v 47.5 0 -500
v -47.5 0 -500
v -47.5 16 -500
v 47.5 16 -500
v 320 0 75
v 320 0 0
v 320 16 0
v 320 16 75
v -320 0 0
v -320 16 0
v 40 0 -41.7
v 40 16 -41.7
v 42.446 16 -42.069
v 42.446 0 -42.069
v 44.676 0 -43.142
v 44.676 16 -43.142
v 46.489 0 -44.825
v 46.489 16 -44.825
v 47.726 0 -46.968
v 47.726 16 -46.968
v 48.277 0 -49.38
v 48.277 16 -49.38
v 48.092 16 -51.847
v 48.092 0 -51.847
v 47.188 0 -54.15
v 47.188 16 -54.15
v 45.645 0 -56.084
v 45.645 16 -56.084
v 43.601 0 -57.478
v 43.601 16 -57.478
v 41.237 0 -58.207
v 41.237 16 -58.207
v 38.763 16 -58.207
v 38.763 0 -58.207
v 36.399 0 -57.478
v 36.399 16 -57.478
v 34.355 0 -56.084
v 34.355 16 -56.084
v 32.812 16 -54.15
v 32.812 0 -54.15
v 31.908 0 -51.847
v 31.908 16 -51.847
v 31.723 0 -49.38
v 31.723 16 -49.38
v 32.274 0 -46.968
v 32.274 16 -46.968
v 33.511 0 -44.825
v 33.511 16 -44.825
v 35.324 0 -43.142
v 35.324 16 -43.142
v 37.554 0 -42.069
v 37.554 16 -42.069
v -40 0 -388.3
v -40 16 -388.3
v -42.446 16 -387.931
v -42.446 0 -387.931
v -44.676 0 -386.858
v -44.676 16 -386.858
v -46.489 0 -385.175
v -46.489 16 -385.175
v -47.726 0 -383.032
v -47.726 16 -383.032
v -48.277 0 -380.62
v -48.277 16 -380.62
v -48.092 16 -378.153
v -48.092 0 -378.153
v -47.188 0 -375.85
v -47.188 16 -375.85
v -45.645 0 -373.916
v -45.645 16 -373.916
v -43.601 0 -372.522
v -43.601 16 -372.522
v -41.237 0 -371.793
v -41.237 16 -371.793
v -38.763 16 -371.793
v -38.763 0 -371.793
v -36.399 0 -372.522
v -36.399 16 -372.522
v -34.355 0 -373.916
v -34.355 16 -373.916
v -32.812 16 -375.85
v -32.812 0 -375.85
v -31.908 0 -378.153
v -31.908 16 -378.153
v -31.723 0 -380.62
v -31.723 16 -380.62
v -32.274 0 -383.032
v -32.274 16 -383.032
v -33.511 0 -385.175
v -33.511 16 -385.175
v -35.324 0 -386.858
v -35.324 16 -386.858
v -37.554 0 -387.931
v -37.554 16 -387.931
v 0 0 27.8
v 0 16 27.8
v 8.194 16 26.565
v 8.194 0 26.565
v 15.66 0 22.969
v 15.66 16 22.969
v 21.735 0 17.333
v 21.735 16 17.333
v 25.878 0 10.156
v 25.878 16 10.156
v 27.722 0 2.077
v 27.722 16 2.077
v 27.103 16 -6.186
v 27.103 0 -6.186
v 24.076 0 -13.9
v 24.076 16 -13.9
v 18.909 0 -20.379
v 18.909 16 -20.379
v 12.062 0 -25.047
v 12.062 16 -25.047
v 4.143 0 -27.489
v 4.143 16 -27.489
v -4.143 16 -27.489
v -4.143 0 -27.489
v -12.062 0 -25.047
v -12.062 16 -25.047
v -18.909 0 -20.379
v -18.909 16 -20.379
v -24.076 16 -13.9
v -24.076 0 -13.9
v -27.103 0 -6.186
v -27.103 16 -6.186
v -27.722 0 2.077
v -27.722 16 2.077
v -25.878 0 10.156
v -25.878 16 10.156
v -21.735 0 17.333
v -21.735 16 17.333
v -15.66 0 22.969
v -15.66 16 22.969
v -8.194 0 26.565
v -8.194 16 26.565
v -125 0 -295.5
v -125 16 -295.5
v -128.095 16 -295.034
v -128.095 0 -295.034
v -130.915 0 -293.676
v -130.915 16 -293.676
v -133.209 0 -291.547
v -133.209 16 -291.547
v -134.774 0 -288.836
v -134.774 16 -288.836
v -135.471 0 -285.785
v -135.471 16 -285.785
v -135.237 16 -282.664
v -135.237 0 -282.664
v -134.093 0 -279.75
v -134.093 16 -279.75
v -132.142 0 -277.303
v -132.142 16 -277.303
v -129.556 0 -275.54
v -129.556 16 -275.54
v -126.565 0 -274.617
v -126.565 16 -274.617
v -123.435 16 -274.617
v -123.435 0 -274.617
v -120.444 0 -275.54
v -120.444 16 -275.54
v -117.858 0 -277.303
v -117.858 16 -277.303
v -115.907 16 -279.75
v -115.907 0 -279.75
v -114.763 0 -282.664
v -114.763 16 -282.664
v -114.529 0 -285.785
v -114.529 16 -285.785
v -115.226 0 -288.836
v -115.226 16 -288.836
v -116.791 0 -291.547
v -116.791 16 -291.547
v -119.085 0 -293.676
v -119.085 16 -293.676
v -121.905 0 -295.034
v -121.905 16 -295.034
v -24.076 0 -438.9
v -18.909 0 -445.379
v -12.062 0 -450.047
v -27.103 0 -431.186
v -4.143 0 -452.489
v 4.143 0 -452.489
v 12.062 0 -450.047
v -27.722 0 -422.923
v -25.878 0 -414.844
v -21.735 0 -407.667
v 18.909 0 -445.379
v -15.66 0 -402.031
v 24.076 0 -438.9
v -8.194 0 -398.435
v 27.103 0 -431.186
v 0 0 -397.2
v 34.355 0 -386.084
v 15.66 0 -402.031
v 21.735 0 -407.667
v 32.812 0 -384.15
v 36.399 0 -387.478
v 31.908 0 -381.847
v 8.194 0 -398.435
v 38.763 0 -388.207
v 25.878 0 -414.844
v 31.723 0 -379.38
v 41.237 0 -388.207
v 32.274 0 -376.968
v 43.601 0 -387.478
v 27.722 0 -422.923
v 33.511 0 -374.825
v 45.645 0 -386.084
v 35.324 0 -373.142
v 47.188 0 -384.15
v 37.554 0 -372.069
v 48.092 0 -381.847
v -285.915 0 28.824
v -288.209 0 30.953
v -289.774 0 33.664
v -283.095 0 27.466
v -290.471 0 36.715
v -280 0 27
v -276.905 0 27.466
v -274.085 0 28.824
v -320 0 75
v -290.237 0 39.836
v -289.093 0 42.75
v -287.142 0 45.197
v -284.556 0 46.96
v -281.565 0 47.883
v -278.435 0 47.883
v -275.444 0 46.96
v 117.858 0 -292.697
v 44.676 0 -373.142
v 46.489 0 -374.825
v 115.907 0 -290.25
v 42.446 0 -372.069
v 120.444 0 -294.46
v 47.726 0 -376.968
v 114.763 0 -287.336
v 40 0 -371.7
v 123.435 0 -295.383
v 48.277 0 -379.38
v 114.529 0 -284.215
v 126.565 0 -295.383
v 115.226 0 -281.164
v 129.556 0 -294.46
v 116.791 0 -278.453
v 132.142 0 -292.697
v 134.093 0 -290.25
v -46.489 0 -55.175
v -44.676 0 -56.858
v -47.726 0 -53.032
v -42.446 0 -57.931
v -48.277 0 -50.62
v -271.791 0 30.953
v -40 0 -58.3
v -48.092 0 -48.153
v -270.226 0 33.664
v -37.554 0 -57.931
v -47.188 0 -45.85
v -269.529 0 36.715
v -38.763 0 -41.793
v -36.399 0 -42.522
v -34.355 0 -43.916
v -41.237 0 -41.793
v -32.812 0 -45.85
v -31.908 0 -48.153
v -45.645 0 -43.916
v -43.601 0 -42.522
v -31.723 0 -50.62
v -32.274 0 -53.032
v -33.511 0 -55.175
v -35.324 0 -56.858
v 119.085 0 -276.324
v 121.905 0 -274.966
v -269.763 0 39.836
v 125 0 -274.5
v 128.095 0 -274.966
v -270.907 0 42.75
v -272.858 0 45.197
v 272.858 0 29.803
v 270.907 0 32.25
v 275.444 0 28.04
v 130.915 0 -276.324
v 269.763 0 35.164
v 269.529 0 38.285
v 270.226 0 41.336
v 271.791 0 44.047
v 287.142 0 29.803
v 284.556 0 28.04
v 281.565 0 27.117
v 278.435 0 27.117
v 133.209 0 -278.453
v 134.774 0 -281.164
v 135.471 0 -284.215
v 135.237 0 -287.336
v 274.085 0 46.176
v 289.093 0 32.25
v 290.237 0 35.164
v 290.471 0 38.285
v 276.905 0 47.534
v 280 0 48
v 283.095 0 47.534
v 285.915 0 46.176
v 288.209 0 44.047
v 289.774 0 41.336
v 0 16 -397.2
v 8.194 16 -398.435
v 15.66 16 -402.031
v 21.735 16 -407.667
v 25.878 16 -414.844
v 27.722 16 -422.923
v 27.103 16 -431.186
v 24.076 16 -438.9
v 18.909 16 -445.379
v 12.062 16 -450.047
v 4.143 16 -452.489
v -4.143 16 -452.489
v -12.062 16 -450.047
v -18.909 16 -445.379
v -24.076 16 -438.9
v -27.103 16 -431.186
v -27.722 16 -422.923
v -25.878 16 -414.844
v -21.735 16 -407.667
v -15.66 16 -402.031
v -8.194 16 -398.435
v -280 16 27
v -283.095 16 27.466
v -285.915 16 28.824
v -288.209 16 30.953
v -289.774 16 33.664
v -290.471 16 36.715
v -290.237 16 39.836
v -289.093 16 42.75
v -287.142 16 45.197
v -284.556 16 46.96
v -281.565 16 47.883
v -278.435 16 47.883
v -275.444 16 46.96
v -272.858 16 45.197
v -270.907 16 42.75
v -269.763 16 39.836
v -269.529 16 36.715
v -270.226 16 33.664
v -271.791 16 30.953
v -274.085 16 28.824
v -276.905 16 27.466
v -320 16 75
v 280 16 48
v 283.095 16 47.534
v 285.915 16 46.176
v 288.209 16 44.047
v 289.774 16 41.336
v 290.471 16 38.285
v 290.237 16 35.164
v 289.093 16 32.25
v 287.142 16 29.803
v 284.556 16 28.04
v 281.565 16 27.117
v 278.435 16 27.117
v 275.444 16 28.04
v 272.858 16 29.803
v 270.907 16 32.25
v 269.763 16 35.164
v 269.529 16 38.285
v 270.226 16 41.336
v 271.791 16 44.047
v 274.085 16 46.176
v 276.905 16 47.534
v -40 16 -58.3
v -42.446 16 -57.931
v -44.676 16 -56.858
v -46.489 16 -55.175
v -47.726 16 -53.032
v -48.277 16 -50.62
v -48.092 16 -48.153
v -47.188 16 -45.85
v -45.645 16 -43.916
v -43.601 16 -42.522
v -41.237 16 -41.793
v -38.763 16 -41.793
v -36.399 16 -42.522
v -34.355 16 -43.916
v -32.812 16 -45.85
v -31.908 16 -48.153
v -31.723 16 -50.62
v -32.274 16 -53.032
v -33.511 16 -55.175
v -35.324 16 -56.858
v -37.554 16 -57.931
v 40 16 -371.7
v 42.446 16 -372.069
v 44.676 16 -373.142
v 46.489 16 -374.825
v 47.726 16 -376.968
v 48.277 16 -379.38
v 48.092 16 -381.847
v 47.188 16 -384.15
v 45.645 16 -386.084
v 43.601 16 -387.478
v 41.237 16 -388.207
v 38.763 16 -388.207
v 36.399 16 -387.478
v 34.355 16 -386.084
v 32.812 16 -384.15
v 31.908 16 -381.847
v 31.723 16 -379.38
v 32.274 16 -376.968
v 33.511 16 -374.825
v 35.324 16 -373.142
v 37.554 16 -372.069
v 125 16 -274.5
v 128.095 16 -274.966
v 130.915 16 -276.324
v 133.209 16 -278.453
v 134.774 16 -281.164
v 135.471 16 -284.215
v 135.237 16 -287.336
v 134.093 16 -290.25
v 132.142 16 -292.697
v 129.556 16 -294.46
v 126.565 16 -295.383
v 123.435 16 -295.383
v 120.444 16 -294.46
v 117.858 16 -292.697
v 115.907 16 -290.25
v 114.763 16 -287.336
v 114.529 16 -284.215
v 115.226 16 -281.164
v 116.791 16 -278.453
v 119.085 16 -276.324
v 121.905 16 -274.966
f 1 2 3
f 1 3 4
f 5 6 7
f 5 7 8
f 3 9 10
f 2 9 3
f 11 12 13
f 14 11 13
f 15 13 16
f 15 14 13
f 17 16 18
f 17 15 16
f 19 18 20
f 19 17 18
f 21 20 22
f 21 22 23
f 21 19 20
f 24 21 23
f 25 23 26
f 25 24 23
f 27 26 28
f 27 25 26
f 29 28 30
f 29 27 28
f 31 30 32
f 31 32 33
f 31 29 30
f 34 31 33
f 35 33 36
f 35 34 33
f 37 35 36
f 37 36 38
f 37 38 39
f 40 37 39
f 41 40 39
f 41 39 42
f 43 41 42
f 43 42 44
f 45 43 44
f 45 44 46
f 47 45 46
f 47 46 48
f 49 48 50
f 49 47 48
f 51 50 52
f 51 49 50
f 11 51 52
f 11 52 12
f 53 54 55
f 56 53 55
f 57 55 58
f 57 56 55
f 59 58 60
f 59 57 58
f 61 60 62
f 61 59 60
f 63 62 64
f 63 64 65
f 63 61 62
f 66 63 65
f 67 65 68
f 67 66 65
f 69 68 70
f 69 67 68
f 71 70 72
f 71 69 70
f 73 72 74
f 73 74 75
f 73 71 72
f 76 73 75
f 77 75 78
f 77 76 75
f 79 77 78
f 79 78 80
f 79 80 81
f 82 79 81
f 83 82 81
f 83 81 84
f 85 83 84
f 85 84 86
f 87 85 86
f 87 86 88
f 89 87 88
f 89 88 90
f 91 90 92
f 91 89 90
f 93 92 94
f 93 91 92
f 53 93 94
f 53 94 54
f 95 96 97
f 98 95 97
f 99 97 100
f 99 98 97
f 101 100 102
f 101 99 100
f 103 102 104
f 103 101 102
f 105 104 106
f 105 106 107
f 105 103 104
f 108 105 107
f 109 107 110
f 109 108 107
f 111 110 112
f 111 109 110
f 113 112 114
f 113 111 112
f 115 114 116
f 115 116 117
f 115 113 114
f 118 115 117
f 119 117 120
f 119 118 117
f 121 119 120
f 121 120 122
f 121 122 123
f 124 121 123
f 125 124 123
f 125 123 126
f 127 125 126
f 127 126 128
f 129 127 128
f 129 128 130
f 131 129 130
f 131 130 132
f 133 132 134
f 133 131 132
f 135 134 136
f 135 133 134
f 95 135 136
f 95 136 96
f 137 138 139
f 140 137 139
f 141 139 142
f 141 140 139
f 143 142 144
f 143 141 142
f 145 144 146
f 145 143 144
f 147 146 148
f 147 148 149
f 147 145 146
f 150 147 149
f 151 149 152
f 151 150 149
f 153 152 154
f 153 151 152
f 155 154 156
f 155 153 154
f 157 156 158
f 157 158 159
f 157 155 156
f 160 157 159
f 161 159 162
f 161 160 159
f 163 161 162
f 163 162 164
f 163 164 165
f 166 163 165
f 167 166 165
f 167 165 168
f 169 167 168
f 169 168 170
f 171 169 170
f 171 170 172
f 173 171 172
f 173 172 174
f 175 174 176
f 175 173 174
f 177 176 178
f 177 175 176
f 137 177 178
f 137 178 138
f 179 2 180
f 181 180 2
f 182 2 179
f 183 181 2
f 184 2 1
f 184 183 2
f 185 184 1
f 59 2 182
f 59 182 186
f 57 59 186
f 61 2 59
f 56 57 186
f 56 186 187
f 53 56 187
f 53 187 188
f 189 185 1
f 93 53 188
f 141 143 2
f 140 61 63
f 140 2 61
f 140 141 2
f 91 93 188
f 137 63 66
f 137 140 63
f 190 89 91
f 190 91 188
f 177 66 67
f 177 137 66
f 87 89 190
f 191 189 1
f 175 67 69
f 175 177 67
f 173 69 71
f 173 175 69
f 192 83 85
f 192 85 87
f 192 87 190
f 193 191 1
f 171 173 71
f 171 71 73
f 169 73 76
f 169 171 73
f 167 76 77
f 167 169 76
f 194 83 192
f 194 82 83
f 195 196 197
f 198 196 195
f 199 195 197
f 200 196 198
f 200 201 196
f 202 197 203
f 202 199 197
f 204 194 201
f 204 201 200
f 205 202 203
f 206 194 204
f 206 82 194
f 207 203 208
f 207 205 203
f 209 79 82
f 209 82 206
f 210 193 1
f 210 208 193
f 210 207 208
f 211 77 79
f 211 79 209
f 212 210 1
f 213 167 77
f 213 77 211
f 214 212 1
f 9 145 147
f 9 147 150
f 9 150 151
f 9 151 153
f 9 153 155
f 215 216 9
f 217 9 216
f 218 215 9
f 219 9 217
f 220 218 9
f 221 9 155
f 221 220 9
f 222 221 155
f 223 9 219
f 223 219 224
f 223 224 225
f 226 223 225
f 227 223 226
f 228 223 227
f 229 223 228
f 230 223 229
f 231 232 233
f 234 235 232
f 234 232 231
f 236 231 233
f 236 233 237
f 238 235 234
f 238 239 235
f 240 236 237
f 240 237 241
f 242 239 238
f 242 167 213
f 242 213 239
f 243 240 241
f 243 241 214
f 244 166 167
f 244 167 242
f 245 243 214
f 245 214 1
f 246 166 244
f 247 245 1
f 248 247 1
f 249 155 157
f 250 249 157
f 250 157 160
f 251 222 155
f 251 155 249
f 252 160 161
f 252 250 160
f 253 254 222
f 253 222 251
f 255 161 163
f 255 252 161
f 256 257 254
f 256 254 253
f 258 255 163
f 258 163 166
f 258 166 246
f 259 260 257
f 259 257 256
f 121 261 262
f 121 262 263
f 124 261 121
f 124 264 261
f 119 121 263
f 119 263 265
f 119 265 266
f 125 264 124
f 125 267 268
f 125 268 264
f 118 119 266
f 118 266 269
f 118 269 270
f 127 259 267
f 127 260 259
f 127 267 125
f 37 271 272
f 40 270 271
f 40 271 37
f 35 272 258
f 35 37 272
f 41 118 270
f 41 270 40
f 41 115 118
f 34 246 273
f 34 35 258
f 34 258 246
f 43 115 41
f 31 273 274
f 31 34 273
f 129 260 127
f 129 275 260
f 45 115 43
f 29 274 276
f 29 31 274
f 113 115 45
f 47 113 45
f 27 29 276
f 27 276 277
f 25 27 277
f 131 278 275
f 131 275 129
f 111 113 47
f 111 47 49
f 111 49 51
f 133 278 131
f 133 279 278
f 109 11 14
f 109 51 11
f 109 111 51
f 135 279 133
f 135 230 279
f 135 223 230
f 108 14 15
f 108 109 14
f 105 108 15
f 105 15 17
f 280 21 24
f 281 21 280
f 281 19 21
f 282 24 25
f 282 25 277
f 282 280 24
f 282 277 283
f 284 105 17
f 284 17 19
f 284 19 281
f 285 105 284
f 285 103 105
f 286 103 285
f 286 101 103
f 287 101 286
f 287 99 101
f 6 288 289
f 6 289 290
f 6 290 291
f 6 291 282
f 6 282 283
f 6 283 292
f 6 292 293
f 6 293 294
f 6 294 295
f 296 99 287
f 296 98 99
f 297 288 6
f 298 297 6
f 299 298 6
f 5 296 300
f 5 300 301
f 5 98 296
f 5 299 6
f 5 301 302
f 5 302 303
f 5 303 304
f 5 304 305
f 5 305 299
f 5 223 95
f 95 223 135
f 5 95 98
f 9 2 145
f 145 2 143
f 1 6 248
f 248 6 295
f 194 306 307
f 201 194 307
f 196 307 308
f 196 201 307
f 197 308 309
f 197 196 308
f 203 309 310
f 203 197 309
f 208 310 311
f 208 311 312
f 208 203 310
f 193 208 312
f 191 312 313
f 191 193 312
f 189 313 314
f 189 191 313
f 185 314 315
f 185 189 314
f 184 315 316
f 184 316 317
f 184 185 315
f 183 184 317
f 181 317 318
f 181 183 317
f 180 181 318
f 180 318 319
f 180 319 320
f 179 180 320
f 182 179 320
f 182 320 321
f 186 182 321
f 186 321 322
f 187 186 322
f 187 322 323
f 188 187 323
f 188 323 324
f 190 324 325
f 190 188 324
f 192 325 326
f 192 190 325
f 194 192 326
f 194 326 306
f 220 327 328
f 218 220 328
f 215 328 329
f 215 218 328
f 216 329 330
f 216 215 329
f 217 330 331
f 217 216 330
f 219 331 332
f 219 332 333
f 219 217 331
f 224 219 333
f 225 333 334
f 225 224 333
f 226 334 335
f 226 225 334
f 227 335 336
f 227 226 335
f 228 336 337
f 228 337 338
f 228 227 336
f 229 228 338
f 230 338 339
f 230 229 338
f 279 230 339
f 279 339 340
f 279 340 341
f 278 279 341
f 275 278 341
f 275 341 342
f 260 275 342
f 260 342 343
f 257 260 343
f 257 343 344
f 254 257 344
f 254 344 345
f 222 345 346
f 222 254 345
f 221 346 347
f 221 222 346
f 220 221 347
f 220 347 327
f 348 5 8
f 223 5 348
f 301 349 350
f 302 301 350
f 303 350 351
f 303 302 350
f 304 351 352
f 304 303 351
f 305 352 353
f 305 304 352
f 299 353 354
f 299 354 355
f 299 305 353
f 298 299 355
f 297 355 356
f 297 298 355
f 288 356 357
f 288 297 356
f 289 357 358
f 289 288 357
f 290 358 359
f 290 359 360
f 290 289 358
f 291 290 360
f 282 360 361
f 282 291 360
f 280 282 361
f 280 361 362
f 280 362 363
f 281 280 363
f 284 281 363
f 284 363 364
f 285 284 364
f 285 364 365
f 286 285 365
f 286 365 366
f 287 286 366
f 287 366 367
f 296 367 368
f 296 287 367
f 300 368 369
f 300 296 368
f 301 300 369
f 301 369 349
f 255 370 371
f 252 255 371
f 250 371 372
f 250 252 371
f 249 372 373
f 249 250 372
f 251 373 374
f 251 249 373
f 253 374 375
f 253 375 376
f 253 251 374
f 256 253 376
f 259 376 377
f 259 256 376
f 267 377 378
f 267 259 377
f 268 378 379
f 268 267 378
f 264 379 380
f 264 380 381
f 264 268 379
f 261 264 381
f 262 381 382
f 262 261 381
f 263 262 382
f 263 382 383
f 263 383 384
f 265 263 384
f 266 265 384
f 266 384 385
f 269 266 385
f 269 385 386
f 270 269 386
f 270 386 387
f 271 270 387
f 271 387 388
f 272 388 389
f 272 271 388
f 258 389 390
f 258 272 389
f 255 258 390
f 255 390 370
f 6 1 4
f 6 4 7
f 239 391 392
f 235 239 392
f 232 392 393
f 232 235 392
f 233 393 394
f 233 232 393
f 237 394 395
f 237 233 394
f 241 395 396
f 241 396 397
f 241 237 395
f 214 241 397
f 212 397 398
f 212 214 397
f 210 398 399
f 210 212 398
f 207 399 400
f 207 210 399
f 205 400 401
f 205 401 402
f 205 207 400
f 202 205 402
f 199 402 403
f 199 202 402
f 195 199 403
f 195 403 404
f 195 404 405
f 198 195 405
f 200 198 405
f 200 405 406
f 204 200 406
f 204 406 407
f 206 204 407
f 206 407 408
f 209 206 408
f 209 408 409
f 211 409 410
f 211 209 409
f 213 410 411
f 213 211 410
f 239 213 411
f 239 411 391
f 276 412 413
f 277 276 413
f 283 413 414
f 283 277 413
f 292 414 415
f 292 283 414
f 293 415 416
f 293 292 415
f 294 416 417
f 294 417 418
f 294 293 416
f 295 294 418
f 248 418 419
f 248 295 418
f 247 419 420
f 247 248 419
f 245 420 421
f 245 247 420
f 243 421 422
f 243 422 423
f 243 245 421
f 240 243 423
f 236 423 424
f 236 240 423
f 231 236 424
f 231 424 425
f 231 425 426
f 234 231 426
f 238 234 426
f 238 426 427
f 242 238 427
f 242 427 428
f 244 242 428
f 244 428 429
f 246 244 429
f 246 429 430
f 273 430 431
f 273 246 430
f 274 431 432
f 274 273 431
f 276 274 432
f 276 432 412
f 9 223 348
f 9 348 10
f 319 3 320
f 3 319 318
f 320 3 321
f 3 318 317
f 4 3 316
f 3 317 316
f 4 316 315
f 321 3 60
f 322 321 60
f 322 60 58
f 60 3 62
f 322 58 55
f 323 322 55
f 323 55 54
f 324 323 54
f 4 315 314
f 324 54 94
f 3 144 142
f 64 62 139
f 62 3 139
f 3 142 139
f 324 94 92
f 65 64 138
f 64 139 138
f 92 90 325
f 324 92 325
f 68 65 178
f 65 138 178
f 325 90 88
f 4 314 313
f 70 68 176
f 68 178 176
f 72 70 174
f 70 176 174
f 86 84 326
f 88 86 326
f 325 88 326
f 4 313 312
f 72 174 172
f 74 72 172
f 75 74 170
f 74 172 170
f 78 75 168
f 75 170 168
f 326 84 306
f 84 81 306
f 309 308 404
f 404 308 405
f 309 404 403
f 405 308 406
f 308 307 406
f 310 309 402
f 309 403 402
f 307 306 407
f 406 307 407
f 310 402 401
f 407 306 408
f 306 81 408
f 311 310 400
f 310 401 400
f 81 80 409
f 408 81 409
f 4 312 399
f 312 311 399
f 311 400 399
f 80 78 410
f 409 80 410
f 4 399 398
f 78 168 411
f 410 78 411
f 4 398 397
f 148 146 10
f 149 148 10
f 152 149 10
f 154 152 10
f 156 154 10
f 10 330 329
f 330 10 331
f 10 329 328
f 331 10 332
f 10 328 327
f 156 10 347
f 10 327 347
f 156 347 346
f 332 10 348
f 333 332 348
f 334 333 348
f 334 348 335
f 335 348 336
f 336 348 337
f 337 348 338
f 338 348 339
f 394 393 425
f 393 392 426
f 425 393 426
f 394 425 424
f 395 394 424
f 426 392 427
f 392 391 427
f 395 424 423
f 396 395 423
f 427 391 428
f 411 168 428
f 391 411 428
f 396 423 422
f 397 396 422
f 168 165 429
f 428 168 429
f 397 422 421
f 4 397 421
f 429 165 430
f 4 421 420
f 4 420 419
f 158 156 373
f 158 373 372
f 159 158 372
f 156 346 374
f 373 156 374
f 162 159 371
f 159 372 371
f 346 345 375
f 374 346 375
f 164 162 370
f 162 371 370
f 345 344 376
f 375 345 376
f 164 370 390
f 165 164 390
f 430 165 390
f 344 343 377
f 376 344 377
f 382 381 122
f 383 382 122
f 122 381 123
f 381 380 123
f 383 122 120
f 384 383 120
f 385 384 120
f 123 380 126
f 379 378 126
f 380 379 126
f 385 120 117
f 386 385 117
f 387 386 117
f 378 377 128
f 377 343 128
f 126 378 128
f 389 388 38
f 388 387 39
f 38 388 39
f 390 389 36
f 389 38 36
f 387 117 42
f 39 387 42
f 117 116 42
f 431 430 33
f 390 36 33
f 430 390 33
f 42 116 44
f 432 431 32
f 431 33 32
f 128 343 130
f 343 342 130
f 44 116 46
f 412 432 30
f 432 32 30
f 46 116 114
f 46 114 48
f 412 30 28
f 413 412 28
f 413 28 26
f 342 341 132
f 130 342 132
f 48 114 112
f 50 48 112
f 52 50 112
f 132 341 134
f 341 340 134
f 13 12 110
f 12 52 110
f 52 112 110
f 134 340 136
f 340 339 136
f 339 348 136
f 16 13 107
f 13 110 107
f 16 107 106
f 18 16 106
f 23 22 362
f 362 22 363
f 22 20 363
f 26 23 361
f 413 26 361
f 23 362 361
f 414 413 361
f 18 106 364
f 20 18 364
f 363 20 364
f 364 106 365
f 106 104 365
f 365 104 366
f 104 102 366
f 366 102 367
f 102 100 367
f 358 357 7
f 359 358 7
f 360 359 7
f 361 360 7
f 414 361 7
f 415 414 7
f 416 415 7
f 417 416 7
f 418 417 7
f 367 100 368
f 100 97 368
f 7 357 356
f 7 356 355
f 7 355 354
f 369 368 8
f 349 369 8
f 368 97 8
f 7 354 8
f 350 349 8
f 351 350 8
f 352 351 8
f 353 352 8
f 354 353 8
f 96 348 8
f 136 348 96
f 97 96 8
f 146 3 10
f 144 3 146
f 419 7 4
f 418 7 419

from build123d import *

# Parameters (mm, degrees)
SKETCH1_R           = 27.8
SKETCH1_R_2         = 8.3
SKETCH1_R_3         = 10.5
BOSS_EXTRUDE1_DEPTH = 16


with BuildPart() as part:
    # Sketch1 → Boss-Extrude1 (new body)
    with BuildSketch(Plane(origin=(0, 0, 0), x_dir=(-1, 0, 0), z_dir=(0, 1, 0))):
        Polygon((-320, 75), (320, 75), (320, 0), (47.5, -500), (-47.5, -500), (-320, 0), align=None)
        with Locations(Location((0, 0, 0), (0, 0, 90))):
            Circle(SKETCH1_R, mode=Mode.SUBTRACT)
        with Locations(Location((0, -425, 0), (0, 0, 90))):
            Circle(SKETCH1_R, mode=Mode.SUBTRACT)
        with Locations(Location((-40, -50, 0), (0, 0, 90))):
            Circle(SKETCH1_R_2, mode=Mode.SUBTRACT)
        with Locations(Location((40, -50, 0), (0, 0, 270))):
            Circle(SKETCH1_R_2, mode=Mode.SUBTRACT)
        with Locations(Location((-40, -380, 0), (0, 0, 90))):
            Circle(SKETCH1_R_2, mode=Mode.SUBTRACT)
        with Locations(Location((40, -380, 0), (0, 0, 270))):
            Circle(SKETCH1_R_2, mode=Mode.SUBTRACT)
        with Locations(Location((-280, 37.5, 0), (0, 0, 90))):
            Circle(SKETCH1_R_3, mode=Mode.SUBTRACT)
        with Locations(Location((280, 37.5, 0), (0, 0, 270))):
            Circle(SKETCH1_R_3, mode=Mode.SUBTRACT)
        with Locations(Location((-125, -285, 0), (0, 0, 90))):
            Circle(SKETCH1_R_3, mode=Mode.SUBTRACT)
        with Locations(Location((125, -285, 0), (0, 0, 270))):
            Circle(SKETCH1_R_3, mode=Mode.SUBTRACT)
    extrude(amount=BOSS_EXTRUDE1_DEPTH)


solid = part.part
